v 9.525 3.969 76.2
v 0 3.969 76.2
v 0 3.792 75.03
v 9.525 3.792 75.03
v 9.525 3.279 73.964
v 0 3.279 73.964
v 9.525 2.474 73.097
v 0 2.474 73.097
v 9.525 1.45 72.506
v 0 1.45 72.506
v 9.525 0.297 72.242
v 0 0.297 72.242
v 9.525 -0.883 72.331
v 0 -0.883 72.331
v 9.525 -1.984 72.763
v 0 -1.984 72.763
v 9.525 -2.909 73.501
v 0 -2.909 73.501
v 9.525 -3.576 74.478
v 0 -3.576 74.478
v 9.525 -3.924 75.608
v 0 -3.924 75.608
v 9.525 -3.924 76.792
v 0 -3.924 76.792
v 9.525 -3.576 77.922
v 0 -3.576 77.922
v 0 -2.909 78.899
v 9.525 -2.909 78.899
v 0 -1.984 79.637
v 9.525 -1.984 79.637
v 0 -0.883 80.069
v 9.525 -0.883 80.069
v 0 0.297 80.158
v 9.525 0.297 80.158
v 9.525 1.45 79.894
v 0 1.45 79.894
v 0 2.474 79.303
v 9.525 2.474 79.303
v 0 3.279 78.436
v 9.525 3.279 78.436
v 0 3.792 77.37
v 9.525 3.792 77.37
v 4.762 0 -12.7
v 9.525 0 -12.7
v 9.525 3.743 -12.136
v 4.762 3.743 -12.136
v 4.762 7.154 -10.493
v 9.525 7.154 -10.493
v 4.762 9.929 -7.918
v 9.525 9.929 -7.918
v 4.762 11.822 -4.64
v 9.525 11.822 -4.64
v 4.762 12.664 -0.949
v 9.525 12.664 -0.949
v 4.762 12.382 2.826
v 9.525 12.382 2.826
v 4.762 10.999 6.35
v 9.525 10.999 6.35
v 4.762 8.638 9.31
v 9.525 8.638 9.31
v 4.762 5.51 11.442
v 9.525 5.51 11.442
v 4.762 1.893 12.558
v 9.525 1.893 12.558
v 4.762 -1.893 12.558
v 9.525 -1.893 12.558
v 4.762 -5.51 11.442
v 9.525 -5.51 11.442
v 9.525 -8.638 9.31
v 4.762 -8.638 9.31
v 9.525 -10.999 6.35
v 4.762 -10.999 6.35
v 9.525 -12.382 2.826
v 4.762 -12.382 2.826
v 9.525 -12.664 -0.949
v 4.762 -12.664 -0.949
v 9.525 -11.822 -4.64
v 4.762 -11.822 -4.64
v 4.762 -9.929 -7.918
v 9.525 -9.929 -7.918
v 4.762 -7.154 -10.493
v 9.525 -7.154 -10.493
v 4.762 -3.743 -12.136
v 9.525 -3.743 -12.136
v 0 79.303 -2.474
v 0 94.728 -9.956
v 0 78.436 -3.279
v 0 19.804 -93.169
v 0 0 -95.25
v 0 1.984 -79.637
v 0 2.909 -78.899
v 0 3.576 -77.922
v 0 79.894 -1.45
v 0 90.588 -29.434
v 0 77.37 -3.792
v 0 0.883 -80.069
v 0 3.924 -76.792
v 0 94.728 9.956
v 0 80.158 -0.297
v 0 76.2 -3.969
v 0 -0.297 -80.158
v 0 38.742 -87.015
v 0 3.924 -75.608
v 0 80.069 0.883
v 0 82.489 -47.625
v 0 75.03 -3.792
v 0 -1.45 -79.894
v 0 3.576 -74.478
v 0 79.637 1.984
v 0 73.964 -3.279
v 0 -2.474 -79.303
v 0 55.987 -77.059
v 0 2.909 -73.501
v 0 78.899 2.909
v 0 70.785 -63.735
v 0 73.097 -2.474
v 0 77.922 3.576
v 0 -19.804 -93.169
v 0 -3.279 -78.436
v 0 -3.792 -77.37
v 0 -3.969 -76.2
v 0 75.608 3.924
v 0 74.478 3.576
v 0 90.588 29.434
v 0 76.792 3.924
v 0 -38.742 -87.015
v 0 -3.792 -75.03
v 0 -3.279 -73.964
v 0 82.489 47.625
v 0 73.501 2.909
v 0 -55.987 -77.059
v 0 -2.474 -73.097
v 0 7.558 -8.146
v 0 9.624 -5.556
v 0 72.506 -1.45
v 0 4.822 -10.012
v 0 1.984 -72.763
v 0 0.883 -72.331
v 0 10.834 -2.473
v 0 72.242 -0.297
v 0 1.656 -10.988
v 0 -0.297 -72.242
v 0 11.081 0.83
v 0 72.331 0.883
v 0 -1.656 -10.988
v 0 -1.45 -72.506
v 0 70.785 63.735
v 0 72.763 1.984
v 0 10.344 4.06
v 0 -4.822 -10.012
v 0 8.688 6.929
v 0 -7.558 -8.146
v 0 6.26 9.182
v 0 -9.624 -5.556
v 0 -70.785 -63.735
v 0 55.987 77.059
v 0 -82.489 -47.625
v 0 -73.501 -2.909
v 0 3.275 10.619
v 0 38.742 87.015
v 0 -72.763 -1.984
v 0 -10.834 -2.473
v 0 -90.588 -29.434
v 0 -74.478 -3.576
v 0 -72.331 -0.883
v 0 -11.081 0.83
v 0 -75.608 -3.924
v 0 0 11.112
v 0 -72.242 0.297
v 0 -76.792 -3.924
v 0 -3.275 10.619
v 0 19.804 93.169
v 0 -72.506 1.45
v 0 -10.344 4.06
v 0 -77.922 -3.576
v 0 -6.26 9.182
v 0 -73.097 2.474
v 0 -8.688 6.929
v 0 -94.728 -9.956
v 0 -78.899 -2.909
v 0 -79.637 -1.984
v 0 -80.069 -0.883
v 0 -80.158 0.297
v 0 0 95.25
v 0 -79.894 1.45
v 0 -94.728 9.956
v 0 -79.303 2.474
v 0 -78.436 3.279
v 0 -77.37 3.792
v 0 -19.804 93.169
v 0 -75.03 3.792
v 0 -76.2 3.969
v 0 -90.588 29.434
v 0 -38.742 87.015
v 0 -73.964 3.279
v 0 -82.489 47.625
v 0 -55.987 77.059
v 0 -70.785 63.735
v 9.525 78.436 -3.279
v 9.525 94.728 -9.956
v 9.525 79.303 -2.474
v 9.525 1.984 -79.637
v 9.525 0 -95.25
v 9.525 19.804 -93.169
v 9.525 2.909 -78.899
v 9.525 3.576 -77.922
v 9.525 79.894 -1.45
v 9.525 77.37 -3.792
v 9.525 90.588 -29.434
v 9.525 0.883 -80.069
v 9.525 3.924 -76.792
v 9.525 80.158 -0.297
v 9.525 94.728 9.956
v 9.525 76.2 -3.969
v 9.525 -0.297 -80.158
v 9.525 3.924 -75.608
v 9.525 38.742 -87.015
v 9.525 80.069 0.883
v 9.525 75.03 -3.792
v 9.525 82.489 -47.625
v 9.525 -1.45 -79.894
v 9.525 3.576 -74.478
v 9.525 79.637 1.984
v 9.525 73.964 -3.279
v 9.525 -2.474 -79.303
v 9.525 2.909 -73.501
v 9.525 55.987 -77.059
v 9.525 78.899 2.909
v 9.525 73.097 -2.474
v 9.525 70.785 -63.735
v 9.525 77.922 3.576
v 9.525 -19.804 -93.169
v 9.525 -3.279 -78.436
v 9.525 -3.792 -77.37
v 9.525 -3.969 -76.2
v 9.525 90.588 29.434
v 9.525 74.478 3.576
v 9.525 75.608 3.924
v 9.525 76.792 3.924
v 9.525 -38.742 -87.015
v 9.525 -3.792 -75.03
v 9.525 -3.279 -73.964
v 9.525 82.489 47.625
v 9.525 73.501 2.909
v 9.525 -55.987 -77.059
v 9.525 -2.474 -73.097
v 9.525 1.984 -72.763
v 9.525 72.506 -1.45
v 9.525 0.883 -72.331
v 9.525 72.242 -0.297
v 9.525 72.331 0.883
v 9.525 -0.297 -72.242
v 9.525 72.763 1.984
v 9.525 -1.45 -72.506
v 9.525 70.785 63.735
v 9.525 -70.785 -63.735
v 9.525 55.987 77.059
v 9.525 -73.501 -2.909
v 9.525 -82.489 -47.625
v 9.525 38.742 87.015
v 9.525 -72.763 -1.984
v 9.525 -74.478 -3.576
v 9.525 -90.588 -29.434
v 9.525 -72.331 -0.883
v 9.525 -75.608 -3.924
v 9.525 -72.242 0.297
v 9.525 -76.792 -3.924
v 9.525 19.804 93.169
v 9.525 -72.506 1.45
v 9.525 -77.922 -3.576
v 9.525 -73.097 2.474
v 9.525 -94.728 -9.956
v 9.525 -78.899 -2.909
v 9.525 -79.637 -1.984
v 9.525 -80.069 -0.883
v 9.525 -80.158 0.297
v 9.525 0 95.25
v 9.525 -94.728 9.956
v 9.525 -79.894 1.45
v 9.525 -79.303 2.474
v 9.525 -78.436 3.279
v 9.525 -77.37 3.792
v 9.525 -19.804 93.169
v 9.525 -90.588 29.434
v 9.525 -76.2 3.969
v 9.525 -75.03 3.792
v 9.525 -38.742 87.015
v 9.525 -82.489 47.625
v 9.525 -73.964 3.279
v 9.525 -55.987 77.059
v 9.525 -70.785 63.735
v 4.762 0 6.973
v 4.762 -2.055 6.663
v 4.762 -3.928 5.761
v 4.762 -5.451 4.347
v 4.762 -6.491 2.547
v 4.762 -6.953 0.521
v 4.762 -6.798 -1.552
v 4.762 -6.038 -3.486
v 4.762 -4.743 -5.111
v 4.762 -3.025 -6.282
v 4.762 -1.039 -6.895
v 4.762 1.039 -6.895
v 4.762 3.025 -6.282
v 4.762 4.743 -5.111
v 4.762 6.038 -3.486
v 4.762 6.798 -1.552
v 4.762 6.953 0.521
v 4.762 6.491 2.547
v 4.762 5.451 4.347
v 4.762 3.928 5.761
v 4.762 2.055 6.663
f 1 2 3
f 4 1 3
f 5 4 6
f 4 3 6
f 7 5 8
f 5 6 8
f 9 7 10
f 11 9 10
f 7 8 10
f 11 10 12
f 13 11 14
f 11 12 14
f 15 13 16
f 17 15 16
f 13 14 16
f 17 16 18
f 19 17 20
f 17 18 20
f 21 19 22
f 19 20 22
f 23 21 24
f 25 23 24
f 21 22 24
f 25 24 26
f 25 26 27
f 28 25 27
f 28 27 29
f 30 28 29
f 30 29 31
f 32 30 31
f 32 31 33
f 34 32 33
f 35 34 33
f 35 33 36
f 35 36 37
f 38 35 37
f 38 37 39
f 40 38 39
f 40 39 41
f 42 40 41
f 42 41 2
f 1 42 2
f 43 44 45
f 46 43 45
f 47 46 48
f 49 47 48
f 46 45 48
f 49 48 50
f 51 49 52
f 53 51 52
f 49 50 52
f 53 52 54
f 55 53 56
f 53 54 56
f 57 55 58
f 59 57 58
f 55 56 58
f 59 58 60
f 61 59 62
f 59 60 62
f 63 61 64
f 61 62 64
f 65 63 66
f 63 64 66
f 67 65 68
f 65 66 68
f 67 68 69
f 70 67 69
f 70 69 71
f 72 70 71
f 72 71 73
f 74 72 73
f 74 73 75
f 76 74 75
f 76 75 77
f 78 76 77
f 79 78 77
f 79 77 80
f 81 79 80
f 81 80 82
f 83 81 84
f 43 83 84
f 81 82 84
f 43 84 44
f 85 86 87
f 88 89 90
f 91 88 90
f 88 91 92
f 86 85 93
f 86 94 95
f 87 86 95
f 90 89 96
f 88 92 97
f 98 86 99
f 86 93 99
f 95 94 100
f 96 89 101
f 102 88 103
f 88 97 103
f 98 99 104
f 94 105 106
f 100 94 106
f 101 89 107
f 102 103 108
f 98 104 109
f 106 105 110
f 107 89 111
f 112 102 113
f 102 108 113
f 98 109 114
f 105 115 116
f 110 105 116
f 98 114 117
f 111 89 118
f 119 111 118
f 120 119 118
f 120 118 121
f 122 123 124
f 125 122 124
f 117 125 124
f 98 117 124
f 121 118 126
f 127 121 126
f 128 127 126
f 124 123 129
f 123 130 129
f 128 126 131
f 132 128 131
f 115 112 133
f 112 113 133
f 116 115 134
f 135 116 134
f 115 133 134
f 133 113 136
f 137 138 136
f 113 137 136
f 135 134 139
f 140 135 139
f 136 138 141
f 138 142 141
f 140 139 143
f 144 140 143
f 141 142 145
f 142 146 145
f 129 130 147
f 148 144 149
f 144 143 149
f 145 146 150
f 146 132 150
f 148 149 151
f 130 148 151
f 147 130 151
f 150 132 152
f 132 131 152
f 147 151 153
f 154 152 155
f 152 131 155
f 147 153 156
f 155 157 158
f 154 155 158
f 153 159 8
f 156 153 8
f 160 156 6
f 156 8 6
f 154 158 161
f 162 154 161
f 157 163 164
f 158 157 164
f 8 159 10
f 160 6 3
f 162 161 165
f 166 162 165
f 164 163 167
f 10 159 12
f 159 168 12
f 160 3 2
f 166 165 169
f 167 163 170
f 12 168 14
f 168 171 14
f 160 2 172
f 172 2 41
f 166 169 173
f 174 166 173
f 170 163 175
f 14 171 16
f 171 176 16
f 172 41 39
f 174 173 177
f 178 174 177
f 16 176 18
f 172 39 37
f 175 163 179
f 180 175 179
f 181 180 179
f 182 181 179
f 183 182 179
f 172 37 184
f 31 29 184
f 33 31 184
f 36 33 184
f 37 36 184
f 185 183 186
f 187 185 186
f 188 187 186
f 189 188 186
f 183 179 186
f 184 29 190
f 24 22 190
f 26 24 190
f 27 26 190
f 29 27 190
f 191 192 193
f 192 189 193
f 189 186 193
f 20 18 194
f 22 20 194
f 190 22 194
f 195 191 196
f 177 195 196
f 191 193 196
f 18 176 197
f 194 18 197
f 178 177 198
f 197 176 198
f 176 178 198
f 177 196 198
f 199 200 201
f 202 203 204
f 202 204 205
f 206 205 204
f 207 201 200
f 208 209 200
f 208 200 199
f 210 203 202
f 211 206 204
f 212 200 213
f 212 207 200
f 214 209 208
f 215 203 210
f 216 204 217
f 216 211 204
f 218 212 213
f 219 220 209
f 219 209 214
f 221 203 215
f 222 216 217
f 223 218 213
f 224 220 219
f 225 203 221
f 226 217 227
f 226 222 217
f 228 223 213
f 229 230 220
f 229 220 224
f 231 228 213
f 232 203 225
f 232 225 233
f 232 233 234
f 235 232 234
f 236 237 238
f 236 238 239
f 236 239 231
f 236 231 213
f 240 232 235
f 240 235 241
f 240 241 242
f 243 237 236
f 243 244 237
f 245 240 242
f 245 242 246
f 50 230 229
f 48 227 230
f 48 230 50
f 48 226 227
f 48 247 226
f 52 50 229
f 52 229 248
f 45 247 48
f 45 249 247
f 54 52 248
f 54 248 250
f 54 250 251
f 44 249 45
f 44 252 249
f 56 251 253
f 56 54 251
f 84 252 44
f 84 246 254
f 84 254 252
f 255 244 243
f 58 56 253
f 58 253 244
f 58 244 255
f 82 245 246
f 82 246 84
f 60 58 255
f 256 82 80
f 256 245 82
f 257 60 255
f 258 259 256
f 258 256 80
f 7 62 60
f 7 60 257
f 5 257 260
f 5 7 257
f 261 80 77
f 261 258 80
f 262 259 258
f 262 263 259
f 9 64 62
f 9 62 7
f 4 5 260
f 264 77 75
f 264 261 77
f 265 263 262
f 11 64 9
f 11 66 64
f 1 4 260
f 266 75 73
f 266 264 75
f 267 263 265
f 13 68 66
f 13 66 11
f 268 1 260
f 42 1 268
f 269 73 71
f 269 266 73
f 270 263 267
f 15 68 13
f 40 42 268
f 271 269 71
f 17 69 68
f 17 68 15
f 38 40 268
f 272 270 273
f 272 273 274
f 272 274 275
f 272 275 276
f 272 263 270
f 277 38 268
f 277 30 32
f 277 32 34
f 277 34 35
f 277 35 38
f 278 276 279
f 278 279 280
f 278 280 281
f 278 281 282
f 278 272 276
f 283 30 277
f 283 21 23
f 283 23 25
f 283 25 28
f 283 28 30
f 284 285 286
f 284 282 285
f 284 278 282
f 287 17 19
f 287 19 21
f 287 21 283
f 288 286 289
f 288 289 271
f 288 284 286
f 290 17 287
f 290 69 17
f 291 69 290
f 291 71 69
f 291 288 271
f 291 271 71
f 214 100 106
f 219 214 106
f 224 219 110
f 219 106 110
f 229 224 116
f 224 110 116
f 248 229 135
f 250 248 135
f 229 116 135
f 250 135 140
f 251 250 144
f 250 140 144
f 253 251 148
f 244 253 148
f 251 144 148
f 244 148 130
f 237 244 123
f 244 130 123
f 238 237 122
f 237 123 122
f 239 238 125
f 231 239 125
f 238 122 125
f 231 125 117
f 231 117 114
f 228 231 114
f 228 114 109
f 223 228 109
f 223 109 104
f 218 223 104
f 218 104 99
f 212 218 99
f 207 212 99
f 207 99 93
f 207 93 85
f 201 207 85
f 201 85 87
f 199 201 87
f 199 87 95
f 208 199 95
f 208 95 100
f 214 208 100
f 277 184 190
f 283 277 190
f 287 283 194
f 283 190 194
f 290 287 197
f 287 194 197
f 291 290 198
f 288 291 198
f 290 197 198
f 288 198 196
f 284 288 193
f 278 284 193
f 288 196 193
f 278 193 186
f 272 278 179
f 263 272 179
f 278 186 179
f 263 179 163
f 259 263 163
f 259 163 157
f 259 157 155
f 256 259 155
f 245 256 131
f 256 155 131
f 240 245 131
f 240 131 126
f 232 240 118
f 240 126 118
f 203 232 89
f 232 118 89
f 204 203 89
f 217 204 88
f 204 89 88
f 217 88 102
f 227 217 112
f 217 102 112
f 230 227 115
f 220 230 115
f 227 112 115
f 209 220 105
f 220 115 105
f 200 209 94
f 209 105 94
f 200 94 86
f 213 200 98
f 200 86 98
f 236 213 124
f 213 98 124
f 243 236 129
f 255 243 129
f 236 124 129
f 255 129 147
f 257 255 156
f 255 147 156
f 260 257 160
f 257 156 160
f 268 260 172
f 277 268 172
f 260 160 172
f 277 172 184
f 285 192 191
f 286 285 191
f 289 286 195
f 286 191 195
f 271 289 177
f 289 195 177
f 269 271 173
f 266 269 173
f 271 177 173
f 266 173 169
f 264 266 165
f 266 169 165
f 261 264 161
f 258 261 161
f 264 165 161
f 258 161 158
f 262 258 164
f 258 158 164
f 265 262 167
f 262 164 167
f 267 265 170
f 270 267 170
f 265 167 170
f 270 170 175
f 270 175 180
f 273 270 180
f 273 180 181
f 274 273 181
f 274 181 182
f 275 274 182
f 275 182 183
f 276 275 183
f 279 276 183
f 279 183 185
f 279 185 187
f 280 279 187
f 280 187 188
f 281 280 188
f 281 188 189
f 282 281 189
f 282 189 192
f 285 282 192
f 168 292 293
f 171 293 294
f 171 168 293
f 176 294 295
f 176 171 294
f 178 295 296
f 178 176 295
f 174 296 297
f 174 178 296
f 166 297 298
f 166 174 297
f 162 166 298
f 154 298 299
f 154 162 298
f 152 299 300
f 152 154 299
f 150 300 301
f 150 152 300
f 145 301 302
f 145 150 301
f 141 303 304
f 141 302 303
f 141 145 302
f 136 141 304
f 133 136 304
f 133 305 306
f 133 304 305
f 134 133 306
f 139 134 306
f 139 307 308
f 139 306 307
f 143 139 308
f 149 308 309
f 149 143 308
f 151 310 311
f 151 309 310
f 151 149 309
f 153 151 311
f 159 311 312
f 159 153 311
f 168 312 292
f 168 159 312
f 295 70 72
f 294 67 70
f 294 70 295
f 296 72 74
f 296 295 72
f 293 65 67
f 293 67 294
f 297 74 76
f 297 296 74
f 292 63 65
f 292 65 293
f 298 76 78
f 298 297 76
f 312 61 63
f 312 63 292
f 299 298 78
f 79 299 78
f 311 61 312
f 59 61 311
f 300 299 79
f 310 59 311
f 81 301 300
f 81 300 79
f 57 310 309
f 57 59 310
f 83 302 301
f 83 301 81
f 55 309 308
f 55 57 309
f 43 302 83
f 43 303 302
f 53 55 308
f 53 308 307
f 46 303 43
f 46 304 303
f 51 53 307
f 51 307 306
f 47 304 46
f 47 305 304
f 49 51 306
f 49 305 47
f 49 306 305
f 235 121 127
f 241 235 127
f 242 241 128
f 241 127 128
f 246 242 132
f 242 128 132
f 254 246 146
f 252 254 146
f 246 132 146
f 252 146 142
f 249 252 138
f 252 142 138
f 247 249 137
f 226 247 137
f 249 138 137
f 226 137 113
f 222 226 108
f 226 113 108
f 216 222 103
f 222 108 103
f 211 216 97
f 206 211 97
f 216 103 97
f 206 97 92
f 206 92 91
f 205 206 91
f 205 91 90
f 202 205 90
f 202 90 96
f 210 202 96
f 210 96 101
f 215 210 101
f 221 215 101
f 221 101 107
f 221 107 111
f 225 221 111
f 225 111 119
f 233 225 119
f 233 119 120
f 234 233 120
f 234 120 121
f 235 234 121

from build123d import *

# Parameters (mm, degrees)
SKETCH1_R               = 95.25
BOSS_EXTRUDE1_DEPTH     = 9.525
SKETCH2_R               = 12.7
CUT_EXTRUDE1_DEPTH      = 4.7625
F_3_8_16_TAPPED_HOLE1_D = 7.9375
CIRPATTERN1_COUNT       = 4


with BuildPart() as part:
    # Sketch1 → Boss-Extrude1 (new body)
    with BuildSketch(Plane(origin=(0, 0, 0), x_dir=(0, 0, -1), z_dir=(1, 0, 0))):
        with Locations(Location((0, 0, 0), (0, 0, 180))):
            Circle(SKETCH1_R)
    extrude(amount=BOSS_EXTRUDE1_DEPTH)

    # Sketch2 → Cut-Extrude1 (cut)
    with BuildSketch(Plane(origin=(9.525, 0, 0), x_dir=(0, 0, -1), z_dir=(1, 0, 0))):
        Circle(SKETCH2_R)
    extrude(amount=-CUT_EXTRUDE1_DEPTH, mode=Mode.SUBTRACT)

    # Sketch4 → CSK for 1/2 Flat Head Machine Screw1 (revolve, cut)
    with BuildSketch(Plane.ZX):
        Polygon((0, 0), (0, 9.525), (6.74624, 9.525), (6.74624, 5.022807562), (11.1125, 0), align=None)
    revolve(axis=Axis((-6.35, 0, 0), (1, 0, 0)), mode=Mode.SUBTRACT)

    # 3/8-16 Tapped Hole1 (through all)
    with Locations(Plane(origin=(9.525, 0, 0), x_dir=(0, 0, -1), z_dir=(1, 0, 0))):
        with Locations((0, -76.2)):
            f_3_8_16_tapped_hole1 = Hole(F_3_8_16_TAPPED_HOLE1_D / 2)

    # CirPattern1: 3/8-16 Tapped Hole1 ×4 about axis
    cirpattern1_axis = Axis((0, 0, 0), (1, 0, 0))
    for i in range(1, CIRPATTERN1_COUNT):
        add(f_3_8_16_tapped_hole1.rotate(cirpattern1_axis, i * 360 / CIRPATTERN1_COUNT), mode=Mode.SUBTRACT)


solid = part.part
